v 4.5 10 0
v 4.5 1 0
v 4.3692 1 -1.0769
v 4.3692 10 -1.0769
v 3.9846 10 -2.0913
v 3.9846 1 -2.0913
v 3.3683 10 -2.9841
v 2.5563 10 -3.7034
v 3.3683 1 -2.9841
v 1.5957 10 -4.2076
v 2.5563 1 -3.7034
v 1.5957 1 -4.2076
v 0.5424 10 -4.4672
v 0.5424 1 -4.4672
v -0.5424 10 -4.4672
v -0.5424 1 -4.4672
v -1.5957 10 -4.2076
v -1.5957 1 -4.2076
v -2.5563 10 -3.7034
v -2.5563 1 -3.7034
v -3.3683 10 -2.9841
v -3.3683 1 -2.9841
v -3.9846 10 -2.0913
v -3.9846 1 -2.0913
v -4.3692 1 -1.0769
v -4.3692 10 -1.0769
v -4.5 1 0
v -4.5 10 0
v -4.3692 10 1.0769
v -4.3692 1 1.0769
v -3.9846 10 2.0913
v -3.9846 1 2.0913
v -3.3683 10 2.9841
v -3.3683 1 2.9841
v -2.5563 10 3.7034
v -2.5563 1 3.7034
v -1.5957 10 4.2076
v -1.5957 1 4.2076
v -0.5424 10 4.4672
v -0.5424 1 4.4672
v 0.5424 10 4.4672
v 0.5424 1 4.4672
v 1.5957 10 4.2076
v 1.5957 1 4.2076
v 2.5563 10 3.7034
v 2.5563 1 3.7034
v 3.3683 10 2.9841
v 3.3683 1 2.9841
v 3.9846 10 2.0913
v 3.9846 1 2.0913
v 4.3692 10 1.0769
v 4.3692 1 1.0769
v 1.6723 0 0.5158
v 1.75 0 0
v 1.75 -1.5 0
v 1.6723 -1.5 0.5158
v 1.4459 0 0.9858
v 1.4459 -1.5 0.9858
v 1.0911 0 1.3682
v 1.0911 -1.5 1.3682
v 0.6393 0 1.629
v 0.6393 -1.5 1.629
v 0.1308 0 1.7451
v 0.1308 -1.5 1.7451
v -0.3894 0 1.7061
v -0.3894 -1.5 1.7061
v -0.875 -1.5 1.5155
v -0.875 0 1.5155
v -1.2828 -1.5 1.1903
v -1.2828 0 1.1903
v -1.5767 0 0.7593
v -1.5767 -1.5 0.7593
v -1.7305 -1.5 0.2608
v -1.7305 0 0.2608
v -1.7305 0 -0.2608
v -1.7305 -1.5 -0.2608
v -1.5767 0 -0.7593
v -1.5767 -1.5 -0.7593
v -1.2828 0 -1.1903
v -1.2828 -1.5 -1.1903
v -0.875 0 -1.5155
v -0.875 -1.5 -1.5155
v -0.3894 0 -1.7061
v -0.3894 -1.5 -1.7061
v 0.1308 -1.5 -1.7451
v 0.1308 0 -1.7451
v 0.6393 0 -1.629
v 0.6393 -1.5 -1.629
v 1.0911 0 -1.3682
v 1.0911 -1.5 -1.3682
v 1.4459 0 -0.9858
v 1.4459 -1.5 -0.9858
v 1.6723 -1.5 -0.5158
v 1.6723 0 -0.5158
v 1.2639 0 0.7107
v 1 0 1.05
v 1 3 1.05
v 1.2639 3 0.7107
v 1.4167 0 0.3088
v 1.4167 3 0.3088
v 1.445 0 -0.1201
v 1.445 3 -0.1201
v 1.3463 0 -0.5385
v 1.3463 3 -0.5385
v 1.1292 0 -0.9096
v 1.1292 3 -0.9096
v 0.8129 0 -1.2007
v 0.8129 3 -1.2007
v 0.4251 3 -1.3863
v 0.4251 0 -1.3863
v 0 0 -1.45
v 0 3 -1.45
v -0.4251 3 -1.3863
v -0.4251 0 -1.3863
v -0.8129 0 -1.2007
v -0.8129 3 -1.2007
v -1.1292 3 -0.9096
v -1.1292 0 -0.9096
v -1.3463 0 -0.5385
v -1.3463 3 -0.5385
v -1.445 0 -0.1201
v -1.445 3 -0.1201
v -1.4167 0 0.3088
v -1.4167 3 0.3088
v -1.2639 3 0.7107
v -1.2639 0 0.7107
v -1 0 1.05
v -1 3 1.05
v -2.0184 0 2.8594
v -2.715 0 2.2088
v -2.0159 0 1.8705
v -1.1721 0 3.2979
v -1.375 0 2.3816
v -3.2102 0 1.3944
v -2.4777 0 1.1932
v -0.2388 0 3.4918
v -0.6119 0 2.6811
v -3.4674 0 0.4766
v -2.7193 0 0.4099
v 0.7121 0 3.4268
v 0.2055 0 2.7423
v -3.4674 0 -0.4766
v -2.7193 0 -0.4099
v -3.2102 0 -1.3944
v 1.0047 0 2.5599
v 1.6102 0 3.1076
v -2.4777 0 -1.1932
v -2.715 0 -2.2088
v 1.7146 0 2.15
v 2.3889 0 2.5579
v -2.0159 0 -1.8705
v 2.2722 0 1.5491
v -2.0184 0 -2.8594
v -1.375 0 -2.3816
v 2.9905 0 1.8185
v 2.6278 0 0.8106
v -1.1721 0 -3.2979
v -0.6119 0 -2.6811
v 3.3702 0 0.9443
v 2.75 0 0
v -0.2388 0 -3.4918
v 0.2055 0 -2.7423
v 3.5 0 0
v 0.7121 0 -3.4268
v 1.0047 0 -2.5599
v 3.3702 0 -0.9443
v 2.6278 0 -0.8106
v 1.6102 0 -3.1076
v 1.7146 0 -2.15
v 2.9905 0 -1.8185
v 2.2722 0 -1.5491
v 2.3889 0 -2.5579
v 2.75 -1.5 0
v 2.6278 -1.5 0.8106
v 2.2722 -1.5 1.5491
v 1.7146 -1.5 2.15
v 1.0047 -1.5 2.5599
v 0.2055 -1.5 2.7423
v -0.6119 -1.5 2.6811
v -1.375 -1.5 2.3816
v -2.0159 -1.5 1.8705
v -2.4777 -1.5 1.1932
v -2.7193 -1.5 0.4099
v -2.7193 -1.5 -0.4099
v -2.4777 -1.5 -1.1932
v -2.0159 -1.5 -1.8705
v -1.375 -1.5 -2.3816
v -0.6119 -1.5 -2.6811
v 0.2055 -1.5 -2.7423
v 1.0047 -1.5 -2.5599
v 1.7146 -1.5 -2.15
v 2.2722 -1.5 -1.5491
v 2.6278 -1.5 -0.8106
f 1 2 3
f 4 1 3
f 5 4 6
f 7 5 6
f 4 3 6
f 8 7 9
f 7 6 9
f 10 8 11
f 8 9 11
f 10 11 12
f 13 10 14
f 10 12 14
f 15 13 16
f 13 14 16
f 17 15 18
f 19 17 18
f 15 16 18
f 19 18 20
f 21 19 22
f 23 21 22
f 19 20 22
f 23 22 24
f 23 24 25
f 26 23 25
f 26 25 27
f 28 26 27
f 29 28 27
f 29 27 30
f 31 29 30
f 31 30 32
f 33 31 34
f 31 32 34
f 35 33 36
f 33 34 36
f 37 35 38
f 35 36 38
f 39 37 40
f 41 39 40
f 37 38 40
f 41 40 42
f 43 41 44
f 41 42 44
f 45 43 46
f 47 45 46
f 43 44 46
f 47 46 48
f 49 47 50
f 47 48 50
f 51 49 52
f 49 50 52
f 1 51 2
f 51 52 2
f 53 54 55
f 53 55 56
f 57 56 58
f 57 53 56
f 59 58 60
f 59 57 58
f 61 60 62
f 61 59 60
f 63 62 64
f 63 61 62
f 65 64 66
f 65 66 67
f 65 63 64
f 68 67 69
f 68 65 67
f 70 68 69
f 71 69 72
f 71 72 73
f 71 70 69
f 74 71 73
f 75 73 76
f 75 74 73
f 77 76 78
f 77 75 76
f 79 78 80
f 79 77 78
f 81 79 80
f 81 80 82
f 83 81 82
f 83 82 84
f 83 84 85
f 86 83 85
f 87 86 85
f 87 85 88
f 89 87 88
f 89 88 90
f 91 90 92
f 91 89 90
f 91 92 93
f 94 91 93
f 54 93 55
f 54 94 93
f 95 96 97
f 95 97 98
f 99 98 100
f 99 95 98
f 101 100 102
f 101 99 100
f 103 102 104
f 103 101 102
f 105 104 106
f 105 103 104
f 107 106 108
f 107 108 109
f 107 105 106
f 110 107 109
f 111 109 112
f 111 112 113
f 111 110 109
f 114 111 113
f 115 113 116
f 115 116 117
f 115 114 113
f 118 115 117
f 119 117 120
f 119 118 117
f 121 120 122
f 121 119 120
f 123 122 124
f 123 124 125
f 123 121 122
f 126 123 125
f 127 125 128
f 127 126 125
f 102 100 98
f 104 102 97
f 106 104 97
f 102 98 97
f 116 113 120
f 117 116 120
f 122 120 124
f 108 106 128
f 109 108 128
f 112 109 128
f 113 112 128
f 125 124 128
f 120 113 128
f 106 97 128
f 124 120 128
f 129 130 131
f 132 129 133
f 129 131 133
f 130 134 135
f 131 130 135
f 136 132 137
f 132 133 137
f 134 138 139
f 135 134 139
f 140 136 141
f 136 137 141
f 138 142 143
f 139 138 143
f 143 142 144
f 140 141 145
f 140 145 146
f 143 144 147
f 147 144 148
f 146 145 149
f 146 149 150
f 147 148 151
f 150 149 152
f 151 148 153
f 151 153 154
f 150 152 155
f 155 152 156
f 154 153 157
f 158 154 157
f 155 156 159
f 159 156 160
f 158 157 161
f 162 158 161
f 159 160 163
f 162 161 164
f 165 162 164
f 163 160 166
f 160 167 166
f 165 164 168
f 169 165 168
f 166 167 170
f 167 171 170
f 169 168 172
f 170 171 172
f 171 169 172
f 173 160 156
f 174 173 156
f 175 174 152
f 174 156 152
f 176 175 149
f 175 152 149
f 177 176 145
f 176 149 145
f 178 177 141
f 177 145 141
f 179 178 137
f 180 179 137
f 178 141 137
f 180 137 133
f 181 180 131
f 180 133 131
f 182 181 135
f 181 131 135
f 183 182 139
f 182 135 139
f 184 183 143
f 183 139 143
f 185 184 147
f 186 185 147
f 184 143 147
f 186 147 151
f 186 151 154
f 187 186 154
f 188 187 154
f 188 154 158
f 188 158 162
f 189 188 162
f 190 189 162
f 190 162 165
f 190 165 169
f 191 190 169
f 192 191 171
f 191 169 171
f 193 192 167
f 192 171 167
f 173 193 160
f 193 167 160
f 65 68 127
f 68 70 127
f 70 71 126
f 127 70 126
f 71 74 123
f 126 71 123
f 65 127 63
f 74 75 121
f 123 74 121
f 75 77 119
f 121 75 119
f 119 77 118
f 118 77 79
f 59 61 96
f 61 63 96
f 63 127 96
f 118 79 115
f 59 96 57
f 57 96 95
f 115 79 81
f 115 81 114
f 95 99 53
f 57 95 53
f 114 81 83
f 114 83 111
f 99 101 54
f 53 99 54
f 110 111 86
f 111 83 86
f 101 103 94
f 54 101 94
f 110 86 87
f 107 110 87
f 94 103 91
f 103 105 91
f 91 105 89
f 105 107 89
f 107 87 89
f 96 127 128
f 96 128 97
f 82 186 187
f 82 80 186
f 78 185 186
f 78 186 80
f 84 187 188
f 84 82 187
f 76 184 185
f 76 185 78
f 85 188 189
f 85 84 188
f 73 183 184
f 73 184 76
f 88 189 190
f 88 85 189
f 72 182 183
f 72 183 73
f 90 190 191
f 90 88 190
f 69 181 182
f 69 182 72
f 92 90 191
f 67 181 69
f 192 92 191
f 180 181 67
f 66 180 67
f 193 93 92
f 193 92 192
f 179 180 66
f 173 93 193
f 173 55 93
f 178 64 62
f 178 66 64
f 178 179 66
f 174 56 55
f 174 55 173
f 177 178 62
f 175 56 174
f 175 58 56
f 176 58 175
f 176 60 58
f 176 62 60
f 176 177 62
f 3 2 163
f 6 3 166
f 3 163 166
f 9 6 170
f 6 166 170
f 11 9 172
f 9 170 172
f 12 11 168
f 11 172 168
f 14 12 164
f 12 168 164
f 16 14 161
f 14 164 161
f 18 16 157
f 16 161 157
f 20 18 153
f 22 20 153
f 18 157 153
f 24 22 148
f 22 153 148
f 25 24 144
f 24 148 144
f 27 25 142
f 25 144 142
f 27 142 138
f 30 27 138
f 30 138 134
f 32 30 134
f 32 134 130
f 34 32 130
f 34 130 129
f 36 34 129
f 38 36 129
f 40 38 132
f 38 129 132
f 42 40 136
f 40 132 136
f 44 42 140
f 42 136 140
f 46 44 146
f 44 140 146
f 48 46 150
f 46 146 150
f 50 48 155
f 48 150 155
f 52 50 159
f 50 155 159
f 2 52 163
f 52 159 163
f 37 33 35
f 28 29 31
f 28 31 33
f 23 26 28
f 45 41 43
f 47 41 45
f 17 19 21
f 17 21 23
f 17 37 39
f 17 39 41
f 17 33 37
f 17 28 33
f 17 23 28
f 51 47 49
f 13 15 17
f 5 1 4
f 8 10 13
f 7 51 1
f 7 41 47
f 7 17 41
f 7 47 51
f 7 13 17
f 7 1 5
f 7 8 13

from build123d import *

# Parameters (mm, degrees)
SKETCH1_R           = 4.5
BOSS_EXTRUDE1_DEPTH = 10
CUT_EXTRUDE1_DEPTH  = 3
SKETCH3_R           = 2.75
SKETCH3_R_2         = 1.75
BOSS_EXTRUDE2_DEPTH = 1.5
CHAMFER1_SIZE       = 1


with BuildPart() as part:
    # Sketch1 → Boss-Extrude1 (new body)
    with BuildSketch(Plane(origin=(0, 0, 0), x_dir=(1, 0, 0), z_dir=(0, 1, 0))):
        Circle(SKETCH1_R)
    extrude(amount=BOSS_EXTRUDE1_DEPTH)

    # Sketch2 → Cut-Extrude1 (cut)
    with BuildSketch(Plane.XZ):
        with BuildLine():
            Line((-1, 1.05), (1, 1.05))
            ThreePointArc((1, 1.05), (0, -1.45), (-1, 1.05))
        make_face()
    extrude(amount=-CUT_EXTRUDE1_DEPTH, mode=Mode.SUBTRACT)

    # Sketch3 → Boss-Extrude2 (add)
    with BuildSketch(Plane.XZ):
        Circle(SKETCH3_R)
        Circle(SKETCH3_R_2, mode=Mode.SUBTRACT)
    extrude(amount=BOSS_EXTRUDE2_DEPTH)

    # Chamfer1
    chamfer1_edges = [part.edges().sort_by_distance(p)[0] for p in [
        (-4.5, 0, 0),
    ]]
    chamfer(chamfer1_edges, length=CHAMFER1_SIZE)


solid = part.part
